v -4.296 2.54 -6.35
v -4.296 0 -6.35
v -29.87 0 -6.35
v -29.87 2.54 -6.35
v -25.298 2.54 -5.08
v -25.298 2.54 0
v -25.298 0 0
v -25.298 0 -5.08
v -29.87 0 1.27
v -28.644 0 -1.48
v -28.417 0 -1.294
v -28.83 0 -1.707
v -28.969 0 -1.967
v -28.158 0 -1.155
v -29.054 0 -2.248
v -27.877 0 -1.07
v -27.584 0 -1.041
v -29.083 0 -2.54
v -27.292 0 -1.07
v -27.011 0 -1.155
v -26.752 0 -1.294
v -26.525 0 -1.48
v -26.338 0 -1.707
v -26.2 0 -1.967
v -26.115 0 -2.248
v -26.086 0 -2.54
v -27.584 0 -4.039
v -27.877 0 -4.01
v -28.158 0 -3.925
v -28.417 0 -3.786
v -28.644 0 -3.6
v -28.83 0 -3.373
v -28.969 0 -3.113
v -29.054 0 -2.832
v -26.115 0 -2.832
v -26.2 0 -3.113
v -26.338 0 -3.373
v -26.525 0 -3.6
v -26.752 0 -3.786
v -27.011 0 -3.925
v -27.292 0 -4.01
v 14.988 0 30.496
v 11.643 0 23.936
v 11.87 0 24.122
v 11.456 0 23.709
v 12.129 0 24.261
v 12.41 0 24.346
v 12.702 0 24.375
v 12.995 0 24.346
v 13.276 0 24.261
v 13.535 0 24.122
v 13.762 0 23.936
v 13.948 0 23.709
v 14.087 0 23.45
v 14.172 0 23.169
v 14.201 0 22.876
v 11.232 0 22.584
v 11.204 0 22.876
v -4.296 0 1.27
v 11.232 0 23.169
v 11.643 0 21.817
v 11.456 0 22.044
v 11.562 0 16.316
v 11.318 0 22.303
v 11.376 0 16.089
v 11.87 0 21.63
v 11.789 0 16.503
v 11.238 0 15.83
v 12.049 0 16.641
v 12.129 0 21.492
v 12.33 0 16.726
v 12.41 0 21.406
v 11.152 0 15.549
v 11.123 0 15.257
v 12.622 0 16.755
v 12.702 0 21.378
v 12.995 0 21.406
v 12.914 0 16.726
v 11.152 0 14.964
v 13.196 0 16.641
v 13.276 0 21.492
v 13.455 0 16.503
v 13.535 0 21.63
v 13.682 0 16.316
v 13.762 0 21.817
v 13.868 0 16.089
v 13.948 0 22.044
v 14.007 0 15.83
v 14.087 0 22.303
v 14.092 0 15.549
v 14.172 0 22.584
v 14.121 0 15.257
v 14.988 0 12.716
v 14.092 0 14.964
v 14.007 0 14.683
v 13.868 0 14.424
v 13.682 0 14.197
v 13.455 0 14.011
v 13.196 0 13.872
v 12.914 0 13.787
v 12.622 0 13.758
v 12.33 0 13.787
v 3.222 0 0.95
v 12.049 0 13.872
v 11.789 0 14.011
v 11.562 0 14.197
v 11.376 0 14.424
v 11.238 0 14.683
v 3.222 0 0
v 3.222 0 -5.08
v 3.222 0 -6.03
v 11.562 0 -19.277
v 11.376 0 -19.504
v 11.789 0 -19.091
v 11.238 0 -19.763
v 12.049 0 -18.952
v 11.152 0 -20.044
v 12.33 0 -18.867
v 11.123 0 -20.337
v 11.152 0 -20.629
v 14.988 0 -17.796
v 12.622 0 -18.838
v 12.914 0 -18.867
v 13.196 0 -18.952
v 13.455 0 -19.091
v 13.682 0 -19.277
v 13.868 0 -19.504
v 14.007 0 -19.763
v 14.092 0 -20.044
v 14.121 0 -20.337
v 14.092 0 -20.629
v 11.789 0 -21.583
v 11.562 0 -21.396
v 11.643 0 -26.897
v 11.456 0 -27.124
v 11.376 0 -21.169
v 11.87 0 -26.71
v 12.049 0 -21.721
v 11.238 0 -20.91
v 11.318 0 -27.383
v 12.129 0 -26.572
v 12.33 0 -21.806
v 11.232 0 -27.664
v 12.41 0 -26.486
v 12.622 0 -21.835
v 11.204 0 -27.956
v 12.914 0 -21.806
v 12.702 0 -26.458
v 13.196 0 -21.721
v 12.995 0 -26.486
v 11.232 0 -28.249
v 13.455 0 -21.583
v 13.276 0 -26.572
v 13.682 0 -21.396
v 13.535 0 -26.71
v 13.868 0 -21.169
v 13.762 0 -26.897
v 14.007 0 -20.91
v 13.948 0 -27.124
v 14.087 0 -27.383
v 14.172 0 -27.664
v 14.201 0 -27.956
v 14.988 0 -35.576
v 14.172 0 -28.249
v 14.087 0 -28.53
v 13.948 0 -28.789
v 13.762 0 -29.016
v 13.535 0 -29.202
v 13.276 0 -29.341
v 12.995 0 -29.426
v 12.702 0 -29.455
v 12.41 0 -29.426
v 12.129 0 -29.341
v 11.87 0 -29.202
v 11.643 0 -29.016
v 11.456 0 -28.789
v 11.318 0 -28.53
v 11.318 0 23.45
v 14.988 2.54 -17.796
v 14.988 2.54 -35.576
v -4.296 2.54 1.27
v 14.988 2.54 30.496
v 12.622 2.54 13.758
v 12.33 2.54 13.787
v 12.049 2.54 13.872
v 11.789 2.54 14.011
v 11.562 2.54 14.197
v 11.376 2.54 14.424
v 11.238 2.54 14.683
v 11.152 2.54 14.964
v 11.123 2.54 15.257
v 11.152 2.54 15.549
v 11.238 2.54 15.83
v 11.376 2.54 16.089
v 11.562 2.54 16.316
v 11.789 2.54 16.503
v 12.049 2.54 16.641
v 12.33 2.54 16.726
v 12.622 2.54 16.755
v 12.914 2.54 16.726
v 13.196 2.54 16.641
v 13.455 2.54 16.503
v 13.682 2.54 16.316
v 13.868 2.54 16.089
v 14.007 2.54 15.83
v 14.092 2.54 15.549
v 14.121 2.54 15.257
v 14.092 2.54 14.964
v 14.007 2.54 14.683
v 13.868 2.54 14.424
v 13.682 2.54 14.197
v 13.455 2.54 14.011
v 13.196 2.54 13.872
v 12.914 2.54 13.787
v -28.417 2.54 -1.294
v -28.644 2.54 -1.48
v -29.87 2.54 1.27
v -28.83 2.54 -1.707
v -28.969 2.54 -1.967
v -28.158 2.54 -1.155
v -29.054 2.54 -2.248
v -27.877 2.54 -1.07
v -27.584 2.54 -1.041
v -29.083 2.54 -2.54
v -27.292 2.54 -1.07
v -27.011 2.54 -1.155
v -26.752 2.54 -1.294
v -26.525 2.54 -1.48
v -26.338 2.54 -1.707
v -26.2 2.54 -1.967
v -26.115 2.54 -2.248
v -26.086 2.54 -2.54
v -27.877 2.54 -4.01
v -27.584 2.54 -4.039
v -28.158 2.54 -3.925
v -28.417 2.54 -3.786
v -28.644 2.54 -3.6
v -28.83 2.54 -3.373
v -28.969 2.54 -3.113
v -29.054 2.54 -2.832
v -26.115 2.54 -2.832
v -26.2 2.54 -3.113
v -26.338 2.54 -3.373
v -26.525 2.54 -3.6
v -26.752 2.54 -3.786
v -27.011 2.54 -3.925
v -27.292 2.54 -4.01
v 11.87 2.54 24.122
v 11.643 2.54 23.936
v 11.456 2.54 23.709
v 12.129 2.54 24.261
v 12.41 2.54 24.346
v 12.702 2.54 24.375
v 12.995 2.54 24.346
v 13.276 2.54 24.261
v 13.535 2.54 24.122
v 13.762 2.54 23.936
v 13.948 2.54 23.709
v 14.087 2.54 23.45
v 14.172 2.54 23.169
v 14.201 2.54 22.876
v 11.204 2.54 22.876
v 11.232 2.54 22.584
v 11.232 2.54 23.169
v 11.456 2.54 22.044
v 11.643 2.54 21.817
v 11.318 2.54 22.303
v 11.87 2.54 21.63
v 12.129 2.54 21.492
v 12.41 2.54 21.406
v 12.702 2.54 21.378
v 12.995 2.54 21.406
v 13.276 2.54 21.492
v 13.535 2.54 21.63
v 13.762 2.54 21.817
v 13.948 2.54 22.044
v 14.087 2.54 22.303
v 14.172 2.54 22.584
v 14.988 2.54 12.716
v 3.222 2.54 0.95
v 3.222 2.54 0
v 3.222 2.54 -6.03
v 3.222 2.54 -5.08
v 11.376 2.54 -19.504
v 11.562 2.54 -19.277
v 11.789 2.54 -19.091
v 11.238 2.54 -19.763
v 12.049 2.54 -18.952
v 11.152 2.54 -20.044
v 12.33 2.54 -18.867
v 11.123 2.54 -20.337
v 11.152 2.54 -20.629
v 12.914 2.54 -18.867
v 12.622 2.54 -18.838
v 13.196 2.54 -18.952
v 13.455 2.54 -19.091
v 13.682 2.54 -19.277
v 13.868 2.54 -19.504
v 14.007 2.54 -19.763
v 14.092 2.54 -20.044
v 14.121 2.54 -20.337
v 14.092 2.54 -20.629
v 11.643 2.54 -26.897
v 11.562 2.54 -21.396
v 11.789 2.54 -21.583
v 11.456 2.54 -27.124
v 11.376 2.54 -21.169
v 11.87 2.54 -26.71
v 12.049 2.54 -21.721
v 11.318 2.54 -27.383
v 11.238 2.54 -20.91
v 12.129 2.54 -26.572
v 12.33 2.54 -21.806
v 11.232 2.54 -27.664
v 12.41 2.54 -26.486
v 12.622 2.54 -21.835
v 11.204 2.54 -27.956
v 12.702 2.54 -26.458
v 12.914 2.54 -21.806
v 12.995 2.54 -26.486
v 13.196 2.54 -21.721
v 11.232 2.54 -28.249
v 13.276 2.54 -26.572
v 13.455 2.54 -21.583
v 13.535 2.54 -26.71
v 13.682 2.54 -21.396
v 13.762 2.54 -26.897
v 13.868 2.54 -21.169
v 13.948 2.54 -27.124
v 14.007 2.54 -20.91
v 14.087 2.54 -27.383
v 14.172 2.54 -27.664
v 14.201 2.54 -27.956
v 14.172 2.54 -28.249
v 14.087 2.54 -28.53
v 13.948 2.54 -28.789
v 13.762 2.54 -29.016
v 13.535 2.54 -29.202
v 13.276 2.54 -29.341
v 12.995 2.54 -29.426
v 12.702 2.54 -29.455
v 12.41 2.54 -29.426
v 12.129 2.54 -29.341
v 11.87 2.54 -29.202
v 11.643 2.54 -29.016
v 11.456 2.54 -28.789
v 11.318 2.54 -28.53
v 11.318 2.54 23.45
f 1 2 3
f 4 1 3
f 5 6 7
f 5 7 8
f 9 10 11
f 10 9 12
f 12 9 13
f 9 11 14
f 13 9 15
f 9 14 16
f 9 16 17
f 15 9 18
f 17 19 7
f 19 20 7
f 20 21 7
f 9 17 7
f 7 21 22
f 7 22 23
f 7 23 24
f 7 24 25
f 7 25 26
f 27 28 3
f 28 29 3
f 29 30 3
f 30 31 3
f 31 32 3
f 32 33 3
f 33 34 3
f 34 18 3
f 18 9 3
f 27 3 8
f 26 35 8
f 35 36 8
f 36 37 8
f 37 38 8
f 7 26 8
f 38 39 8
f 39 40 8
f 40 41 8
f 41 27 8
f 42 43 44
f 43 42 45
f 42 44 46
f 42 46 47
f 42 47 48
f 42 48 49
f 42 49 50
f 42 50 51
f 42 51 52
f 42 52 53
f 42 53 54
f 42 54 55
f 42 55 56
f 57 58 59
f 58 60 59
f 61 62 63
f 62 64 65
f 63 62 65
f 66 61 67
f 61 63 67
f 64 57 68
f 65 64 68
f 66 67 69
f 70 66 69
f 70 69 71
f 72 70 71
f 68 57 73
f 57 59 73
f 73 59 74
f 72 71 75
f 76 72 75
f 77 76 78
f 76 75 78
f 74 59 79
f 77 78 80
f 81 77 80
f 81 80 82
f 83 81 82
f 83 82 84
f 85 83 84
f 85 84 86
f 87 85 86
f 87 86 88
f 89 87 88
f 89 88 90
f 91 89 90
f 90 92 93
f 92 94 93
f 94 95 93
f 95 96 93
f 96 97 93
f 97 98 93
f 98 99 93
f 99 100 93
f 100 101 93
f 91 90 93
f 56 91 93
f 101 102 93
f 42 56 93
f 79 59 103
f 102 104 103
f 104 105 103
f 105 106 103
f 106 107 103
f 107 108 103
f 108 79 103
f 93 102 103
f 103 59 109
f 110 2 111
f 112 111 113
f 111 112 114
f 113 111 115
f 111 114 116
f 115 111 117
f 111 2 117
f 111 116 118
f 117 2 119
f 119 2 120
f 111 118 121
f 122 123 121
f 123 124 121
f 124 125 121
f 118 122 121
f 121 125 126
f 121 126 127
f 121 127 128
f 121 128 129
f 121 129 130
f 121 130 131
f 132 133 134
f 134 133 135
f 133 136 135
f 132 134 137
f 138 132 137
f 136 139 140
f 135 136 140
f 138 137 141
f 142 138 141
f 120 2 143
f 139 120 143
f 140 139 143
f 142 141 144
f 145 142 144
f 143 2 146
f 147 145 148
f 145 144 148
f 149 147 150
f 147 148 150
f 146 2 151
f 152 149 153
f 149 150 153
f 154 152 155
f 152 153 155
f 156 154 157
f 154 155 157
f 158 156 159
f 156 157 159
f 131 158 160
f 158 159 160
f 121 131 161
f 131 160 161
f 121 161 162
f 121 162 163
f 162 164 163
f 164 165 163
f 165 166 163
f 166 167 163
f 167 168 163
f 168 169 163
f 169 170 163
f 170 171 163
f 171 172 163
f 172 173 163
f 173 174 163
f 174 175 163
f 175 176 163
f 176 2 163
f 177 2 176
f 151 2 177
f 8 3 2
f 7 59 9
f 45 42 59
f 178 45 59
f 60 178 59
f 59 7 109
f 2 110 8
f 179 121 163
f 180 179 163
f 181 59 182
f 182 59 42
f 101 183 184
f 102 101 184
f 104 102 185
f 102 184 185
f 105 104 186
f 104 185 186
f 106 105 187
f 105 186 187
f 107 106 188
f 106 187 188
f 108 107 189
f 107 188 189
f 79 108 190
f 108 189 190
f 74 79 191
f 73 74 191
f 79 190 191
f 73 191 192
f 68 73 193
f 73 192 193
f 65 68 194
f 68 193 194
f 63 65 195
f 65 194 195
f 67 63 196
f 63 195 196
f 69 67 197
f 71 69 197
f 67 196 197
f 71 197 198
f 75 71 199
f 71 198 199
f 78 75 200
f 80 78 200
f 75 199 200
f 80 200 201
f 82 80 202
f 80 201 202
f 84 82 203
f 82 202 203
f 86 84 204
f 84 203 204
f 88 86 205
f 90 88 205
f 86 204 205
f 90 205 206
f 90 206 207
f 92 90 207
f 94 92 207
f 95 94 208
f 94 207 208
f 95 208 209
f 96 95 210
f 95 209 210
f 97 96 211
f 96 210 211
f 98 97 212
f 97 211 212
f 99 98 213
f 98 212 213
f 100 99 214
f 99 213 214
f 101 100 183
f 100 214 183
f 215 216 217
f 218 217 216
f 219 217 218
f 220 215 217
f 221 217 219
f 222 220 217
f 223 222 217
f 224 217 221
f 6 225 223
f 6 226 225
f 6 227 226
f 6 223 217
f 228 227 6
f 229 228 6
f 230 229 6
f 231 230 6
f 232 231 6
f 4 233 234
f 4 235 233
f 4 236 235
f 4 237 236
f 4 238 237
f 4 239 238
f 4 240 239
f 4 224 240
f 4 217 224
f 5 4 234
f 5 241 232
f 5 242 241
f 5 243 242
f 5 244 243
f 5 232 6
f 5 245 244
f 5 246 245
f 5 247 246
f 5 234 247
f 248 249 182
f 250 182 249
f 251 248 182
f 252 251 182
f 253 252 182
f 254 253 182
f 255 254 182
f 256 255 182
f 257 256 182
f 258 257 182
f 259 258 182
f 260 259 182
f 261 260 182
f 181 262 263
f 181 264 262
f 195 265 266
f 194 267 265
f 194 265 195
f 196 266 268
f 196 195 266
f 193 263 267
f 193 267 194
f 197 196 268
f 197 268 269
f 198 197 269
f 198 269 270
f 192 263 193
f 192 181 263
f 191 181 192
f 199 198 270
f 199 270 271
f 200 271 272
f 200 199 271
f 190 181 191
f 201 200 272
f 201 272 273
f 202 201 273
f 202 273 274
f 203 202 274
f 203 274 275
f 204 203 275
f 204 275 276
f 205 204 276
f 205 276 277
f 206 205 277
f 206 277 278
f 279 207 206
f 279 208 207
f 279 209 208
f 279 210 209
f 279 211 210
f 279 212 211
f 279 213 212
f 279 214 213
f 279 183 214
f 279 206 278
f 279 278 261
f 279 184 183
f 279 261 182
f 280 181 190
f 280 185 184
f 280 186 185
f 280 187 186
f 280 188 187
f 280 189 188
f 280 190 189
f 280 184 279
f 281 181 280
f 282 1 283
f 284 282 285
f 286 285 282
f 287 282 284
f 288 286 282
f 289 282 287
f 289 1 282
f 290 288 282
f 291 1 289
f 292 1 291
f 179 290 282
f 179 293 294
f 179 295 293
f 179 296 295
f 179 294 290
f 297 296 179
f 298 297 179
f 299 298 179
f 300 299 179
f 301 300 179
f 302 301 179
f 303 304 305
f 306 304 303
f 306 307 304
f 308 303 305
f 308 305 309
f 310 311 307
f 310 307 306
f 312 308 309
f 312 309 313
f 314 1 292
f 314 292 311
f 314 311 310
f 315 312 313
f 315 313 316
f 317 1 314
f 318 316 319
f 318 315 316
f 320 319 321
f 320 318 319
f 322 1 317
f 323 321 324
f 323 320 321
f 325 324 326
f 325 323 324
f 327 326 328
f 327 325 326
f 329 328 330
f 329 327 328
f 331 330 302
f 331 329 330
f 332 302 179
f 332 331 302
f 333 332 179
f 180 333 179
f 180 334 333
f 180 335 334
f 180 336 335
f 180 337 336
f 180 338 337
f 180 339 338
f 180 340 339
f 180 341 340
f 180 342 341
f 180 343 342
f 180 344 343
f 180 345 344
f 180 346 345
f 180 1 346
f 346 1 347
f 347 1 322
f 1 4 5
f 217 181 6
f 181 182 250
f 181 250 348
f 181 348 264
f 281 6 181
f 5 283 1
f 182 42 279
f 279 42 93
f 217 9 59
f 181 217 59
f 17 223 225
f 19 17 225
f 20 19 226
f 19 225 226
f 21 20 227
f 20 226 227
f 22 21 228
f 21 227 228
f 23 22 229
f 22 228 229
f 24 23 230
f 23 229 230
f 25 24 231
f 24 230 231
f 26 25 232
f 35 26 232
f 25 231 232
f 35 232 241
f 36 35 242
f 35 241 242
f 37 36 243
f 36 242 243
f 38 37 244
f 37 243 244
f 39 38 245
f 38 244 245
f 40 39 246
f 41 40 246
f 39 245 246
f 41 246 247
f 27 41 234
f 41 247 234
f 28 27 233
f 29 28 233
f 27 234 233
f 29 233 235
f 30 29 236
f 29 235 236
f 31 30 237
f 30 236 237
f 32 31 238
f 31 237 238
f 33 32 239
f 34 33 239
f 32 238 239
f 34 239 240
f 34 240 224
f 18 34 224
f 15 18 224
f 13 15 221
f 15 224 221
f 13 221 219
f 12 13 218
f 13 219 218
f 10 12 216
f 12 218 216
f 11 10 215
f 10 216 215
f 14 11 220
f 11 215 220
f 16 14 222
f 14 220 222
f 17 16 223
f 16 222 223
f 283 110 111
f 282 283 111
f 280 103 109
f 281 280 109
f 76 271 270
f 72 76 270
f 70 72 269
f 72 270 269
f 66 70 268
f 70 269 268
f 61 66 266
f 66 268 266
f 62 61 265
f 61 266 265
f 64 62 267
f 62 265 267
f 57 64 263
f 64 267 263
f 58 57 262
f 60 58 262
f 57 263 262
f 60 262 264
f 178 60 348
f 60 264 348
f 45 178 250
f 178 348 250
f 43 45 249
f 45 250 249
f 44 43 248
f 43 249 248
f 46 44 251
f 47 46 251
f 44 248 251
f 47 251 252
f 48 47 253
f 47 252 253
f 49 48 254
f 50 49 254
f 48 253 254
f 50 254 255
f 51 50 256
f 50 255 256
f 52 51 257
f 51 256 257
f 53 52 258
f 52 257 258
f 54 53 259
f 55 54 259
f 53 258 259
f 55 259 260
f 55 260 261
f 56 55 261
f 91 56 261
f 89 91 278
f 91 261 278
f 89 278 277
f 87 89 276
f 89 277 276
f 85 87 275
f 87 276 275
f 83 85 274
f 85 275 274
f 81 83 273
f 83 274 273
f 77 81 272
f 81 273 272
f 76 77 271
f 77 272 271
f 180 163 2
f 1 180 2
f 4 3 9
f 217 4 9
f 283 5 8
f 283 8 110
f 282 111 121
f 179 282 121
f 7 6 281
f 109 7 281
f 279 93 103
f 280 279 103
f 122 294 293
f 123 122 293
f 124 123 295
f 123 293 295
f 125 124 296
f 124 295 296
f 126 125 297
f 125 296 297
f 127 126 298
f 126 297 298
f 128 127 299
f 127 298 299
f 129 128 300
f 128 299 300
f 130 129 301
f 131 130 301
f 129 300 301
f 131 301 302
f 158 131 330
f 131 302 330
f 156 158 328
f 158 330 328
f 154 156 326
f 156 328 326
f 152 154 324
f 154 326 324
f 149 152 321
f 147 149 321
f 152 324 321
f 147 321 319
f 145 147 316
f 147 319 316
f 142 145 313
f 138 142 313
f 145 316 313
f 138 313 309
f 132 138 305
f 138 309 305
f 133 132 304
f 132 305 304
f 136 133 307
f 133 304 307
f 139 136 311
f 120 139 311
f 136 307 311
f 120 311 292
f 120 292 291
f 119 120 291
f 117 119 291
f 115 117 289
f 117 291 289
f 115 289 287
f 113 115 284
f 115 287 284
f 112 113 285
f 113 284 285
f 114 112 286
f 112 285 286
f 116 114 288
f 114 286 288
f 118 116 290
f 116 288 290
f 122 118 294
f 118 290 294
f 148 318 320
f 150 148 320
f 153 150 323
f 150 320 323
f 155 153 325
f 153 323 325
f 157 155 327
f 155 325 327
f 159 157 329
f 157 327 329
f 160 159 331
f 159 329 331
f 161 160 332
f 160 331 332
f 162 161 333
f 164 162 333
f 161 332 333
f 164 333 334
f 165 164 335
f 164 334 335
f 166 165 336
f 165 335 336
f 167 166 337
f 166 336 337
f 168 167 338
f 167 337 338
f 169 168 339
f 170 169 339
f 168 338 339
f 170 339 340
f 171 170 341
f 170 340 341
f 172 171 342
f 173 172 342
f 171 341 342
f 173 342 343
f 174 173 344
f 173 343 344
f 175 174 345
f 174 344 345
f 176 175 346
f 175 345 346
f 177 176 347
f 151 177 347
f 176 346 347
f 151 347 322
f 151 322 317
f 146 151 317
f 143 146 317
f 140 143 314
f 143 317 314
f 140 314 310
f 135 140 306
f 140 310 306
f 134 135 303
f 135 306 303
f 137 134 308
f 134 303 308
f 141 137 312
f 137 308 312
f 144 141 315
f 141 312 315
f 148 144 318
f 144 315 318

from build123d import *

# Parameters (mm, degrees)
BOSS_EXTRUDE2_DEPTH = 2.54
SKETCH7_R           = 1.4986
SKETCH7_W           = 25.4
SKETCH7_H           = 5.08
CUT_EXTRUDE1_DEPTH  = 2.54
CUT_EXTRUDE2_DEPTH  = 47.522645815


with BuildPart() as part:
    # Sketch1 → Boss-Extrude2 (new body)
    with BuildSketch(Plane(origin=(0, 0, 0), x_dir=(1, 0, 0), z_dir=(0, 1, 0))):
        Polygon((3.221868426, 6.029765094), (14.988277627, 17.796174295), (14.988277627, 35.576174295), (-4.295819053, 6.35), (-29.8704, 6.35), (-29.8704, -1.27), (-4.295819053, -1.27), (14.988277627, -30.496174295), (14.988277627, -12.716174295), (3.221868426, -0.949765094), align=None)
    extrude(amount=BOSS_EXTRUDE2_DEPTH)

    # Sketch7 → Cut-Extrude1 (cut)
    with BuildSketch(Plane(origin=(0, 2.54, 0), x_dir=(1, 0, 0), z_dir=(0, 1, 0))):
        with Locations(Location((-27.5844, 2.54, 0), (0, 0, 270))):
            Circle(SKETCH7_R)
        with Locations(Location((12.702277627, 27.956174295, 0), (0, 0, 270))):
            Circle(SKETCH7_R)
        with Locations(Location((12.622030753, 20.33659685, 0), (0, 0, 270))):
            Circle(SKETCH7_R)
        with Locations(Location((12.622030753, -15.25659685, 0), (0, 0, 90))):
            Circle(SKETCH7_R)
        with Locations(Location((12.702277627, -22.876174295, 0), (0, 0, 90))):
            Circle(SKETCH7_R)
        with Locations((-12.5984, 2.54)):
            Rectangle(SKETCH7_W, SKETCH7_H)
    extrude(amount=-CUT_EXTRUDE1_DEPTH, mode=Mode.SUBTRACT)

    # Sketch8 → Cut-Extrude2 (cut, through all)
    with BuildSketch(Plane(origin=(0, 2.54, 0), x_dir=(1, 0, 0), z_dir=(0, 1, 0))):
        Polygon((0.1016, 5.08), (3.221868426, 5.08), (3.221868426, 0), (0, 0), align=None)
    extrude(amount=-CUT_EXTRUDE2_DEPTH, mode=Mode.SUBTRACT)


solid = part.part
